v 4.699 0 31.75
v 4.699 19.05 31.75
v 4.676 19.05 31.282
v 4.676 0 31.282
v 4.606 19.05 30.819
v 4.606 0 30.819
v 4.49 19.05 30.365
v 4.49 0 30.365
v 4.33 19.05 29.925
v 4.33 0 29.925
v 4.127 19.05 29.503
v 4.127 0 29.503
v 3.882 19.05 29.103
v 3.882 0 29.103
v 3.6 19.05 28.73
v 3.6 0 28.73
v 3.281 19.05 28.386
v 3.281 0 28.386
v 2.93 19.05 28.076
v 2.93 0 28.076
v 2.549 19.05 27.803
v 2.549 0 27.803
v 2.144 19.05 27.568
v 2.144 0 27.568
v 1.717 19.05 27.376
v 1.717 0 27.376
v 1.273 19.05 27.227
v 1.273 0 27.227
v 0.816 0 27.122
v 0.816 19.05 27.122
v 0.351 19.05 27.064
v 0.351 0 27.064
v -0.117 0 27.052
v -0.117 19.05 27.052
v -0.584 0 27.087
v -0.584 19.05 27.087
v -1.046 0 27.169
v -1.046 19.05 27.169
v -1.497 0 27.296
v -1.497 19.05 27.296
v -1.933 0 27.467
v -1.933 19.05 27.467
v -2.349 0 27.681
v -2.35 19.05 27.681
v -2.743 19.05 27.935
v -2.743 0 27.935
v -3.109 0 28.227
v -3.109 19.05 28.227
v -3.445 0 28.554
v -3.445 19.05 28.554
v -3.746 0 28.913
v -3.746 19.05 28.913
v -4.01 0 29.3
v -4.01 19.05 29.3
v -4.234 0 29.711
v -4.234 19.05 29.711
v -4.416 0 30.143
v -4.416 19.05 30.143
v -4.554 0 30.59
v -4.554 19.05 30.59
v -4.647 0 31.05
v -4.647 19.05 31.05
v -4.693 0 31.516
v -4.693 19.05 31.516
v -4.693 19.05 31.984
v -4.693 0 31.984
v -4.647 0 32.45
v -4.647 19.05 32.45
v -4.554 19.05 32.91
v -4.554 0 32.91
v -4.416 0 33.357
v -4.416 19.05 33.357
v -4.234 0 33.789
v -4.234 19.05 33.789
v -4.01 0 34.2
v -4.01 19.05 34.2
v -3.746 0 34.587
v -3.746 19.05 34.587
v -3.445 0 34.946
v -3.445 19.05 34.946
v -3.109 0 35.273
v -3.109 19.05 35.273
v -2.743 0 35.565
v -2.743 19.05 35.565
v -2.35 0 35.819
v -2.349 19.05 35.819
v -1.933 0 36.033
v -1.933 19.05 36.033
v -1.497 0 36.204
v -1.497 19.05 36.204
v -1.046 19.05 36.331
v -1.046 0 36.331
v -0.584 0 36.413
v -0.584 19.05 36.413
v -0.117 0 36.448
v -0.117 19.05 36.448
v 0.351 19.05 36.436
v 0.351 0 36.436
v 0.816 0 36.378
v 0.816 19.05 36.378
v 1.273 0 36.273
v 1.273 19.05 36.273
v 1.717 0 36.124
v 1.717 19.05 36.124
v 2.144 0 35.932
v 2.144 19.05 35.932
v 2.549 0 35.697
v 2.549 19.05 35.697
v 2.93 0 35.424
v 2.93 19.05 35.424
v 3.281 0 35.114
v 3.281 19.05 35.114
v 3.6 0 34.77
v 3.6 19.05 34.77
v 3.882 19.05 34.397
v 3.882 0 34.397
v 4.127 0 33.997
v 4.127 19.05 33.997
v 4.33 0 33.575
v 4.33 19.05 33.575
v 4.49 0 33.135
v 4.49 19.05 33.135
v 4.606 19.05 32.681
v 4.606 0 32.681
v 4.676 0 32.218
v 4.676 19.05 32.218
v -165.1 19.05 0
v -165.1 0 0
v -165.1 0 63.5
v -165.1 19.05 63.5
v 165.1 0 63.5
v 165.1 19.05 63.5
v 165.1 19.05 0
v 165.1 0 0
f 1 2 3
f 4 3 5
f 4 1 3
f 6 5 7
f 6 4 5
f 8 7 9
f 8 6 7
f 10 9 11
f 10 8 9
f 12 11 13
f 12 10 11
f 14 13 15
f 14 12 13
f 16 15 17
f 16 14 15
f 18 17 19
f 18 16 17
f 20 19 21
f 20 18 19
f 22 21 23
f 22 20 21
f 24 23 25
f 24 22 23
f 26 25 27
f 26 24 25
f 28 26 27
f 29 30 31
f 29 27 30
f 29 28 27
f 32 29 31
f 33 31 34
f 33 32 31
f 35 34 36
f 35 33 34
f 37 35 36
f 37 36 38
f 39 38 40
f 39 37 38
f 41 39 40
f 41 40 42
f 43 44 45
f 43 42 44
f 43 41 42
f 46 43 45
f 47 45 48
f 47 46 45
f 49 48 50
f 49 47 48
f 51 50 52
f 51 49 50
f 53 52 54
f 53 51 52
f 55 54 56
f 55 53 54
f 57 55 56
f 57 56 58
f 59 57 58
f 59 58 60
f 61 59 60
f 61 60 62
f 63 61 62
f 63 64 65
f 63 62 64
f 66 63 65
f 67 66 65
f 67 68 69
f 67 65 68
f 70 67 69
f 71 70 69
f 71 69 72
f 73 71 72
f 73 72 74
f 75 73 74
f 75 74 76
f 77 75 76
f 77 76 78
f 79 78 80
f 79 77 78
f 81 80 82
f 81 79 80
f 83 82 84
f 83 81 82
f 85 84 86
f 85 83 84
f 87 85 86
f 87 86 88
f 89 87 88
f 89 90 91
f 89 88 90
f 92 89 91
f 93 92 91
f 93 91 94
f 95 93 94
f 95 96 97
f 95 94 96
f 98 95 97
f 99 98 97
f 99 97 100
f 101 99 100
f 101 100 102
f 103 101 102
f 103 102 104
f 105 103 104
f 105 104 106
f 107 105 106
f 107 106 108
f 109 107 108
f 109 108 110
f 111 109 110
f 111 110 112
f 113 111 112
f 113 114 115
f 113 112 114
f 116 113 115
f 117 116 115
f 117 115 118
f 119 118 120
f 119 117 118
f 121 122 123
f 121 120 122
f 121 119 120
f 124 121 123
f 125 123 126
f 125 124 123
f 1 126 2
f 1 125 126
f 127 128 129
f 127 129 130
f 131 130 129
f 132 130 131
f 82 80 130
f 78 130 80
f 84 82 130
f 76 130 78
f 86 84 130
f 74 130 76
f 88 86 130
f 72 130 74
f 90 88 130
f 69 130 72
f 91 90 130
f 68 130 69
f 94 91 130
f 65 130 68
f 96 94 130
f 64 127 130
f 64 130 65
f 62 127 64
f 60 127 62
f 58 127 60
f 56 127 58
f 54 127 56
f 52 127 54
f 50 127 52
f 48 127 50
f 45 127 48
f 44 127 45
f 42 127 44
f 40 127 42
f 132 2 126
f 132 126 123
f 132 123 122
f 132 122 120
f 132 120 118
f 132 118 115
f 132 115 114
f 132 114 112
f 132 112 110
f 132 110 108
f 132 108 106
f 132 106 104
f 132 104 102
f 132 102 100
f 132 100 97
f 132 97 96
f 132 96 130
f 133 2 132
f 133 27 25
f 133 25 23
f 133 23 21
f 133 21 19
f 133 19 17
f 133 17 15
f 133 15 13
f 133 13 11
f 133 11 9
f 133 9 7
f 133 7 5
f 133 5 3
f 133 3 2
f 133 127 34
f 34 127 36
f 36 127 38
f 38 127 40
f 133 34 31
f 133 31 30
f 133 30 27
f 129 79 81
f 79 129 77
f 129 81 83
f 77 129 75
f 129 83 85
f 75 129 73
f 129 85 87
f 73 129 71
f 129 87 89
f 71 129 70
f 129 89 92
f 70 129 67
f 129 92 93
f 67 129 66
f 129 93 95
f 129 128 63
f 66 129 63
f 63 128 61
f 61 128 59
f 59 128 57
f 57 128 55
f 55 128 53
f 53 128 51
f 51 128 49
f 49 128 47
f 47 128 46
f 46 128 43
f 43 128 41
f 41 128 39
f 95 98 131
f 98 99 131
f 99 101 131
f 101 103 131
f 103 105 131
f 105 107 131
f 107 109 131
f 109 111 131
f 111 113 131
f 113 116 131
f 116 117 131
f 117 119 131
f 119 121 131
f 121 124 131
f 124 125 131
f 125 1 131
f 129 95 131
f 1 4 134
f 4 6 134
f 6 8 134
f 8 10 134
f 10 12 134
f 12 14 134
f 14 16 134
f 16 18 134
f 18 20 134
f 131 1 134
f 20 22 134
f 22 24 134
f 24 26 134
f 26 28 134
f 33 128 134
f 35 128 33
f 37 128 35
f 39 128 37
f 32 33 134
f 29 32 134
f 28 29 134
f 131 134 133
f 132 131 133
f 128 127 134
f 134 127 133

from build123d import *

# Parameters (mm, degrees)
SKETCH2_W           = 330.2
SKETCH2_H           = 19.05
BOSS_EXTRUDE1_DEPTH = 63.5
SKETCH4_R           = 4.699
CUT_EXTRUDE2_DEPTH  = 20.05


with BuildPart() as part:
    # Sketch2 → Boss-Extrude1 (new body)
    with BuildSketch(Plane.XY):
        with Locations((0, 9.525)):
            Rectangle(SKETCH2_W, SKETCH2_H)
    extrude(amount=BOSS_EXTRUDE1_DEPTH)

    # Sketch4 → Cut-Extrude2 (cut, through all)
    with BuildSketch(Plane(origin=(0, 0, 0), x_dir=(1, 0, 0), z_dir=(0, 1, 0))):
        with Locations((0, -31.75)):
            Circle(SKETCH4_R)
    extrude(amount=CUT_EXTRUDE2_DEPTH, mode=Mode.SUBTRACT)


solid = part.part
